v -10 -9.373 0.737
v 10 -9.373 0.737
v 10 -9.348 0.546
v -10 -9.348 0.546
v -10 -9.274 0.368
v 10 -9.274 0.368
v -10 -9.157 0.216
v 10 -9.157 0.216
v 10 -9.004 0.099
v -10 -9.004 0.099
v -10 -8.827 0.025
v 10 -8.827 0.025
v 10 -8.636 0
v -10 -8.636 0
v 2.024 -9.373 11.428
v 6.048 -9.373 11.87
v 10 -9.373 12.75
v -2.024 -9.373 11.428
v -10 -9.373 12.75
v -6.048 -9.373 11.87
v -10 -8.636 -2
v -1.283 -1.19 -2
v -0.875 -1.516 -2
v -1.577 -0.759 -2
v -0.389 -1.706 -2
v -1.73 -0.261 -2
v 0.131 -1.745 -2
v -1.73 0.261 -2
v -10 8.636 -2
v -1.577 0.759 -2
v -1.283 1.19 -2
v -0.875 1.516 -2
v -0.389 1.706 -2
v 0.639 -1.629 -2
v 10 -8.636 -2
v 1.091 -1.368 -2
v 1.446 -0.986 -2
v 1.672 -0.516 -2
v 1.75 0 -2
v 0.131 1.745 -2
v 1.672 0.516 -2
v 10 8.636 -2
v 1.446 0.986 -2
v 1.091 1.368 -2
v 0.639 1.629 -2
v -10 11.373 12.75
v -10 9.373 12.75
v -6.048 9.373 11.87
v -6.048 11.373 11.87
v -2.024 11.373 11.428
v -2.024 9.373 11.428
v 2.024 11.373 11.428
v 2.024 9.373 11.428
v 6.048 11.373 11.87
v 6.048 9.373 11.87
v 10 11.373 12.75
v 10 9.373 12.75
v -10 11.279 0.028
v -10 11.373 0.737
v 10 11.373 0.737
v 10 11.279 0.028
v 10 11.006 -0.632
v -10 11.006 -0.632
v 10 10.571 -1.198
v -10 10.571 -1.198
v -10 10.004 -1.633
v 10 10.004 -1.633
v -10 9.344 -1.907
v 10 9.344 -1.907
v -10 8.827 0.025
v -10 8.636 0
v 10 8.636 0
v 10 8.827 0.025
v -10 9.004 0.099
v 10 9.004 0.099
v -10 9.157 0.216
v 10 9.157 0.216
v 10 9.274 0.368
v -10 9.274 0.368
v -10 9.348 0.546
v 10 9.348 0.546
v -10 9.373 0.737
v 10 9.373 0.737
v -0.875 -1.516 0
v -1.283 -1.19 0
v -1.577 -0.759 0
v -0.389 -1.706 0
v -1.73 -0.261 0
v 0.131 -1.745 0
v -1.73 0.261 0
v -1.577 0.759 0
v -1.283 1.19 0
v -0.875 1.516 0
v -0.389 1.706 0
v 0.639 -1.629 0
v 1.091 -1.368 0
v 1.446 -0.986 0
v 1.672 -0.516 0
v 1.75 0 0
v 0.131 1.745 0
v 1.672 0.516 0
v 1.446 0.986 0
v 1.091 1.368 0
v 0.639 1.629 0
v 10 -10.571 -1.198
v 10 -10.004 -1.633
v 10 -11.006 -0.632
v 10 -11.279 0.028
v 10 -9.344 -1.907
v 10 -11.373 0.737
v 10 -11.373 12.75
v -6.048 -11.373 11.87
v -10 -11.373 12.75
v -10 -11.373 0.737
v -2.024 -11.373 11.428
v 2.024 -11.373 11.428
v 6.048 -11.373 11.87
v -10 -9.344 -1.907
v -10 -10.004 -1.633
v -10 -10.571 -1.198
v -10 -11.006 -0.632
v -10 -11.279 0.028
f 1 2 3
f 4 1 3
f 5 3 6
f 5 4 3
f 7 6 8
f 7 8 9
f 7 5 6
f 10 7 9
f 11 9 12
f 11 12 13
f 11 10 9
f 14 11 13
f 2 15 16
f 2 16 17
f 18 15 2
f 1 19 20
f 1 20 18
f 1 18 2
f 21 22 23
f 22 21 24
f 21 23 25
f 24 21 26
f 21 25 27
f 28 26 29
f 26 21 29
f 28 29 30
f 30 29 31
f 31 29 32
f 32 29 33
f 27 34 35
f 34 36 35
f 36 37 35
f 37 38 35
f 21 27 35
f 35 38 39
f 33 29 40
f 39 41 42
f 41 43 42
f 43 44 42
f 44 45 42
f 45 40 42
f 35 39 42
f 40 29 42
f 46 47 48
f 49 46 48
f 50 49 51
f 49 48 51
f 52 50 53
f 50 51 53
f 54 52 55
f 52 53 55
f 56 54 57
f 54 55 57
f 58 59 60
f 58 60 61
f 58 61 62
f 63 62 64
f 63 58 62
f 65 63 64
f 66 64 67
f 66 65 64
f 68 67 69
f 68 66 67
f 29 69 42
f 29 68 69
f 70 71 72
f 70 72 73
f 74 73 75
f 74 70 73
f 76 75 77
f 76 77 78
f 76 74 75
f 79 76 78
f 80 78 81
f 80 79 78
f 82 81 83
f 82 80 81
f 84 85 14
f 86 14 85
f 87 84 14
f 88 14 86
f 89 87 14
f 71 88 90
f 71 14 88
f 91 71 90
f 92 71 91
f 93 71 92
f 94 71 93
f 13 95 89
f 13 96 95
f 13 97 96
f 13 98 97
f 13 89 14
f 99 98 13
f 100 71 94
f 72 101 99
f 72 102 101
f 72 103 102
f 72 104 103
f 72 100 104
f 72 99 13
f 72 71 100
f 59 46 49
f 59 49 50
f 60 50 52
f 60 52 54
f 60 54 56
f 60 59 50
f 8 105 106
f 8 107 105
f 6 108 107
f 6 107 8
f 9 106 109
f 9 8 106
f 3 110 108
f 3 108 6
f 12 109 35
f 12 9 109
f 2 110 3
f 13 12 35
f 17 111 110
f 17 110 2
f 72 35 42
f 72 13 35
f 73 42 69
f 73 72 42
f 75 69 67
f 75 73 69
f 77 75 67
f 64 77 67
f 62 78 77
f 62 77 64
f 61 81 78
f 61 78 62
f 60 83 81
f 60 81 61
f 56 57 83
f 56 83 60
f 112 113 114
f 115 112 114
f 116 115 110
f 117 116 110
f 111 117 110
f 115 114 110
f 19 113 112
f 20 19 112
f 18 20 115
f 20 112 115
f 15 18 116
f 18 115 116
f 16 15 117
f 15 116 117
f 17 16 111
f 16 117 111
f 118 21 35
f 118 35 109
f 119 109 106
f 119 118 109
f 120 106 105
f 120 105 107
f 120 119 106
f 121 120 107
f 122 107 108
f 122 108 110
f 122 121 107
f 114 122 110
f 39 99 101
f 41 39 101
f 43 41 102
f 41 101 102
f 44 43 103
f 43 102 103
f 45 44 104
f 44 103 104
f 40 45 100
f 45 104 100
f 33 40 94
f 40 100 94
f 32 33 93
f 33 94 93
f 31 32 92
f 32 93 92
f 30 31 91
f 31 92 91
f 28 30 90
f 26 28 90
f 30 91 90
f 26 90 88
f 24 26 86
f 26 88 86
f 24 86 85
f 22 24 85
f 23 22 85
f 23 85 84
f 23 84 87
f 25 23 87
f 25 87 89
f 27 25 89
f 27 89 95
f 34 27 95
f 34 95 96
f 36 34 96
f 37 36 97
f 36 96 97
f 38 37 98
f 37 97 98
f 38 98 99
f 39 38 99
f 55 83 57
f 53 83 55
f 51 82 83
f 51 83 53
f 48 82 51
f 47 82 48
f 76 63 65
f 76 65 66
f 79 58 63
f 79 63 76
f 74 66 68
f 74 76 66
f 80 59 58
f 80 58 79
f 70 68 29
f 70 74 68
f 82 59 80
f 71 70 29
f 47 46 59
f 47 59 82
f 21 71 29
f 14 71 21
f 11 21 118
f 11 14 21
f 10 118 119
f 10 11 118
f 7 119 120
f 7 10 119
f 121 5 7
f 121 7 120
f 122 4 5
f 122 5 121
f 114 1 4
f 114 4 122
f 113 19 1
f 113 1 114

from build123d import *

# Parameters (mm, degrees)
SKETCH1_R                  = 1.75
BASE_FLANGE1_DEPTH         = 2
SKETCHED_START             = -24
SKETCHED_BEND1_OUTLINE_W   = 20
SKETCHED_BEND1_OUTLINE_H   = 2
SKETCHED_BEND1_DEPTH       = 12.627322451
SKETCHED_START_2           = 11.372677549
SKETCHED_BEND1_2_OUTLINE_W = 20
SKETCHED_BEND1_2_OUTLINE_H = 2
SKETCHED_BEND1_2_DEPTH     = 12.627322451
SKETCHED_START_3           = -11.114397241
SKETCHED_BEND1_3_DEPTH     = 1.741719692
SKETCHED_START_4           = 9.372677549
SKETCHED_BEND1_4_DEPTH     = 1.710960308
SKETCHED_START_5           = 8.636077549
SKETCHED_BEND1_5_DEPTH     = 2.7366
SKETCHED_START_6           = -11.372677549
SKETCHED_BEND1_6_DEPTH     = 2.7366
SKETCHED_START_7           = -10
SKETCHED_BEND1_7_DEPTH     = 20


with BuildPart() as part:
    # Base-Flange1: sheet metal written as solids
    # Sketch1 → Base-Flange1 (new body)
    with BuildSketch(Plane.XY):
        with BuildLine():
            Line((-10, 23.376973739), (-10, -23.376973739))
            ThreePointArc((-10, -23.376973739), (0, -22), (10, -23.376973739))
            Line((10, -23.376973739), (10, 23.376973739))
            ThreePointArc((10, 23.376973739), (0, 22), (-10, 23.376973739))
        make_face()
        Circle(SKETCH1_R, mode=Mode.SUBTRACT)
    extrude(amount=-BASE_FLANGE1_DEPTH)

    # Sketched Bend1: read off the stored shape, not the designer's step
    # Sketched Bend1 outline → Sketched Bend1 (cut)
    with BuildSketch(Plane(origin=(0, 0, 0), x_dir=(1, 0, 0), z_dir=(0, 1, 0)).offset(SKETCHED_START)):
        with Locations((0, 1)):
            Rectangle(SKETCHED_BEND1_OUTLINE_W, SKETCHED_BEND1_OUTLINE_H)
    extrude(amount=SKETCHED_BEND1_DEPTH, mode=Mode.SUBTRACT)

    # Sketched Bend1 2 outline → Sketched Bend1 2 (cut)
    with BuildSketch(Plane(origin=(0, 0, 0), x_dir=(1, 0, 0), z_dir=(0, 1, 0)).offset(SKETCHED_START_2)):
        with Locations((0, 1)):
            Rectangle(SKETCHED_BEND1_2_OUTLINE_W, SKETCHED_BEND1_2_OUTLINE_H)
    extrude(amount=SKETCHED_BEND1_2_DEPTH, mode=Mode.SUBTRACT)

    # Sketched Bend1 3 outline → Sketched Bend1 3 (add)
    with BuildSketch(Plane(origin=(0, 0, 0), x_dir=(1, 0, 0), z_dir=(0, 1, 0)).offset(SKETCHED_START_3)):
        with BuildLine():
            Line((10, 0), (-10, 0))
            Line((-10, 0), (-10, -12.749651288))
            ThreePointArc((-10, -12.749651288), (0, -11.372677549), (10, -12.749651288))
            Line((10, -12.749651288), (10, 0))
        make_face()
    extrude(amount=SKETCHED_BEND1_3_DEPTH)

    # Sketched Bend1 4 outline → Sketched Bend1 4 (add)
    with BuildSketch(Plane(origin=(0, 0, 0), x_dir=(1, 0, 0), z_dir=(0, 1, 0)).offset(SKETCHED_START_4)):
        with BuildLine():
            Line((10, 0), (-10, 0))
            Line((-10, 0), (-10, -12.749651288))
            ThreePointArc((-10, -12.749651288), (0, -11.372677549), (10, -12.749651288))
            Line((10, -12.749651288), (10, 0))
        make_face()
    extrude(amount=SKETCHED_BEND1_4_DEPTH)

    # Sketched Bend1 5 outline → Sketched Bend1 5 (add)
    with BuildSketch(Plane(origin=(0, 0, 0), x_dir=(1, 0, 0), z_dir=(0, 1, 0)).offset(SKETCHED_START_5)):
        with BuildLine():
            Line((-10, 0), (-10, -12.749651288))
            ThreePointArc((-10, -12.749651288), (0, -11.372677549), (10, -12.749651288))
            Line((10, -12.749651288), (10, 0))
            Line((10, 0), (-10, 0))
        make_face()
    extrude(amount=SKETCHED_BEND1_5_DEPTH)

    # Sketched Bend1 6 outline → Sketched Bend1 6 (add)
    with BuildSketch(Plane(origin=(0, 0, 0), x_dir=(1, 0, 0), z_dir=(0, 1, 0)).offset(SKETCHED_START_6)):
        with BuildLine():
            Line((-10, 0), (-10, -12.749651288))
            ThreePointArc((-10, -12.749651288), (0, -11.372677549), (10, -12.749651288))
            Line((10, -12.749651288), (10, 0))
            Line((10, 0), (-10, 0))
        make_face()
    extrude(amount=SKETCHED_BEND1_6_DEPTH)

    # Sketched Bend1 7 outline → Sketched Bend1 7 (cut)
    with BuildSketch(Plane.YZ.offset(SKETCHED_START_7)):
        with BuildLine():
            Line((-11.372677549, -2), (-8.636077549, -2))
            ThreePointArc((-8.636077549, -2), (-10.571145966, -1.198468418), (-11.372677549, 0.7366))
            Line((-11.372677549, 0.7366), (-11.372677549, -2))
        make_face()
        with BuildLine():
            ThreePointArc((11.372677549, 0.7366), (10.571145966, -1.198468418), (8.636077549, -2))
            Line((8.636077549, -2), (11.372677549, -2))
            Line((11.372677549, -2), (11.372677549, 0.7366))
        make_face()
        with BuildLine():
            Line((-8.636077549, 14), (-9.372677549, 14))
            Line((-9.372677549, 14), (-9.372677549, 0.7366))
            ThreePointArc((-9.372677549, 0.7366), (-9.156932404, 0.215745145), (-8.636077549, 0))
            Line((-8.636077549, 0), (-8.636077549, 14))
        make_face()
        with BuildLine():
            Line((9.372677549, 0.7366), (9.372677549, 14))
            Line((9.372677549, 14), (8.636077549, 14))
            Line((8.636077549, 14), (8.636077549, 0))
            ThreePointArc((8.636077549, 0), (9.156932404, 0.215745145), (9.372677549, 0.7366))
        make_face()
    extrude(amount=SKETCHED_BEND1_7_DEPTH, mode=Mode.SUBTRACT)


solid = part.part
